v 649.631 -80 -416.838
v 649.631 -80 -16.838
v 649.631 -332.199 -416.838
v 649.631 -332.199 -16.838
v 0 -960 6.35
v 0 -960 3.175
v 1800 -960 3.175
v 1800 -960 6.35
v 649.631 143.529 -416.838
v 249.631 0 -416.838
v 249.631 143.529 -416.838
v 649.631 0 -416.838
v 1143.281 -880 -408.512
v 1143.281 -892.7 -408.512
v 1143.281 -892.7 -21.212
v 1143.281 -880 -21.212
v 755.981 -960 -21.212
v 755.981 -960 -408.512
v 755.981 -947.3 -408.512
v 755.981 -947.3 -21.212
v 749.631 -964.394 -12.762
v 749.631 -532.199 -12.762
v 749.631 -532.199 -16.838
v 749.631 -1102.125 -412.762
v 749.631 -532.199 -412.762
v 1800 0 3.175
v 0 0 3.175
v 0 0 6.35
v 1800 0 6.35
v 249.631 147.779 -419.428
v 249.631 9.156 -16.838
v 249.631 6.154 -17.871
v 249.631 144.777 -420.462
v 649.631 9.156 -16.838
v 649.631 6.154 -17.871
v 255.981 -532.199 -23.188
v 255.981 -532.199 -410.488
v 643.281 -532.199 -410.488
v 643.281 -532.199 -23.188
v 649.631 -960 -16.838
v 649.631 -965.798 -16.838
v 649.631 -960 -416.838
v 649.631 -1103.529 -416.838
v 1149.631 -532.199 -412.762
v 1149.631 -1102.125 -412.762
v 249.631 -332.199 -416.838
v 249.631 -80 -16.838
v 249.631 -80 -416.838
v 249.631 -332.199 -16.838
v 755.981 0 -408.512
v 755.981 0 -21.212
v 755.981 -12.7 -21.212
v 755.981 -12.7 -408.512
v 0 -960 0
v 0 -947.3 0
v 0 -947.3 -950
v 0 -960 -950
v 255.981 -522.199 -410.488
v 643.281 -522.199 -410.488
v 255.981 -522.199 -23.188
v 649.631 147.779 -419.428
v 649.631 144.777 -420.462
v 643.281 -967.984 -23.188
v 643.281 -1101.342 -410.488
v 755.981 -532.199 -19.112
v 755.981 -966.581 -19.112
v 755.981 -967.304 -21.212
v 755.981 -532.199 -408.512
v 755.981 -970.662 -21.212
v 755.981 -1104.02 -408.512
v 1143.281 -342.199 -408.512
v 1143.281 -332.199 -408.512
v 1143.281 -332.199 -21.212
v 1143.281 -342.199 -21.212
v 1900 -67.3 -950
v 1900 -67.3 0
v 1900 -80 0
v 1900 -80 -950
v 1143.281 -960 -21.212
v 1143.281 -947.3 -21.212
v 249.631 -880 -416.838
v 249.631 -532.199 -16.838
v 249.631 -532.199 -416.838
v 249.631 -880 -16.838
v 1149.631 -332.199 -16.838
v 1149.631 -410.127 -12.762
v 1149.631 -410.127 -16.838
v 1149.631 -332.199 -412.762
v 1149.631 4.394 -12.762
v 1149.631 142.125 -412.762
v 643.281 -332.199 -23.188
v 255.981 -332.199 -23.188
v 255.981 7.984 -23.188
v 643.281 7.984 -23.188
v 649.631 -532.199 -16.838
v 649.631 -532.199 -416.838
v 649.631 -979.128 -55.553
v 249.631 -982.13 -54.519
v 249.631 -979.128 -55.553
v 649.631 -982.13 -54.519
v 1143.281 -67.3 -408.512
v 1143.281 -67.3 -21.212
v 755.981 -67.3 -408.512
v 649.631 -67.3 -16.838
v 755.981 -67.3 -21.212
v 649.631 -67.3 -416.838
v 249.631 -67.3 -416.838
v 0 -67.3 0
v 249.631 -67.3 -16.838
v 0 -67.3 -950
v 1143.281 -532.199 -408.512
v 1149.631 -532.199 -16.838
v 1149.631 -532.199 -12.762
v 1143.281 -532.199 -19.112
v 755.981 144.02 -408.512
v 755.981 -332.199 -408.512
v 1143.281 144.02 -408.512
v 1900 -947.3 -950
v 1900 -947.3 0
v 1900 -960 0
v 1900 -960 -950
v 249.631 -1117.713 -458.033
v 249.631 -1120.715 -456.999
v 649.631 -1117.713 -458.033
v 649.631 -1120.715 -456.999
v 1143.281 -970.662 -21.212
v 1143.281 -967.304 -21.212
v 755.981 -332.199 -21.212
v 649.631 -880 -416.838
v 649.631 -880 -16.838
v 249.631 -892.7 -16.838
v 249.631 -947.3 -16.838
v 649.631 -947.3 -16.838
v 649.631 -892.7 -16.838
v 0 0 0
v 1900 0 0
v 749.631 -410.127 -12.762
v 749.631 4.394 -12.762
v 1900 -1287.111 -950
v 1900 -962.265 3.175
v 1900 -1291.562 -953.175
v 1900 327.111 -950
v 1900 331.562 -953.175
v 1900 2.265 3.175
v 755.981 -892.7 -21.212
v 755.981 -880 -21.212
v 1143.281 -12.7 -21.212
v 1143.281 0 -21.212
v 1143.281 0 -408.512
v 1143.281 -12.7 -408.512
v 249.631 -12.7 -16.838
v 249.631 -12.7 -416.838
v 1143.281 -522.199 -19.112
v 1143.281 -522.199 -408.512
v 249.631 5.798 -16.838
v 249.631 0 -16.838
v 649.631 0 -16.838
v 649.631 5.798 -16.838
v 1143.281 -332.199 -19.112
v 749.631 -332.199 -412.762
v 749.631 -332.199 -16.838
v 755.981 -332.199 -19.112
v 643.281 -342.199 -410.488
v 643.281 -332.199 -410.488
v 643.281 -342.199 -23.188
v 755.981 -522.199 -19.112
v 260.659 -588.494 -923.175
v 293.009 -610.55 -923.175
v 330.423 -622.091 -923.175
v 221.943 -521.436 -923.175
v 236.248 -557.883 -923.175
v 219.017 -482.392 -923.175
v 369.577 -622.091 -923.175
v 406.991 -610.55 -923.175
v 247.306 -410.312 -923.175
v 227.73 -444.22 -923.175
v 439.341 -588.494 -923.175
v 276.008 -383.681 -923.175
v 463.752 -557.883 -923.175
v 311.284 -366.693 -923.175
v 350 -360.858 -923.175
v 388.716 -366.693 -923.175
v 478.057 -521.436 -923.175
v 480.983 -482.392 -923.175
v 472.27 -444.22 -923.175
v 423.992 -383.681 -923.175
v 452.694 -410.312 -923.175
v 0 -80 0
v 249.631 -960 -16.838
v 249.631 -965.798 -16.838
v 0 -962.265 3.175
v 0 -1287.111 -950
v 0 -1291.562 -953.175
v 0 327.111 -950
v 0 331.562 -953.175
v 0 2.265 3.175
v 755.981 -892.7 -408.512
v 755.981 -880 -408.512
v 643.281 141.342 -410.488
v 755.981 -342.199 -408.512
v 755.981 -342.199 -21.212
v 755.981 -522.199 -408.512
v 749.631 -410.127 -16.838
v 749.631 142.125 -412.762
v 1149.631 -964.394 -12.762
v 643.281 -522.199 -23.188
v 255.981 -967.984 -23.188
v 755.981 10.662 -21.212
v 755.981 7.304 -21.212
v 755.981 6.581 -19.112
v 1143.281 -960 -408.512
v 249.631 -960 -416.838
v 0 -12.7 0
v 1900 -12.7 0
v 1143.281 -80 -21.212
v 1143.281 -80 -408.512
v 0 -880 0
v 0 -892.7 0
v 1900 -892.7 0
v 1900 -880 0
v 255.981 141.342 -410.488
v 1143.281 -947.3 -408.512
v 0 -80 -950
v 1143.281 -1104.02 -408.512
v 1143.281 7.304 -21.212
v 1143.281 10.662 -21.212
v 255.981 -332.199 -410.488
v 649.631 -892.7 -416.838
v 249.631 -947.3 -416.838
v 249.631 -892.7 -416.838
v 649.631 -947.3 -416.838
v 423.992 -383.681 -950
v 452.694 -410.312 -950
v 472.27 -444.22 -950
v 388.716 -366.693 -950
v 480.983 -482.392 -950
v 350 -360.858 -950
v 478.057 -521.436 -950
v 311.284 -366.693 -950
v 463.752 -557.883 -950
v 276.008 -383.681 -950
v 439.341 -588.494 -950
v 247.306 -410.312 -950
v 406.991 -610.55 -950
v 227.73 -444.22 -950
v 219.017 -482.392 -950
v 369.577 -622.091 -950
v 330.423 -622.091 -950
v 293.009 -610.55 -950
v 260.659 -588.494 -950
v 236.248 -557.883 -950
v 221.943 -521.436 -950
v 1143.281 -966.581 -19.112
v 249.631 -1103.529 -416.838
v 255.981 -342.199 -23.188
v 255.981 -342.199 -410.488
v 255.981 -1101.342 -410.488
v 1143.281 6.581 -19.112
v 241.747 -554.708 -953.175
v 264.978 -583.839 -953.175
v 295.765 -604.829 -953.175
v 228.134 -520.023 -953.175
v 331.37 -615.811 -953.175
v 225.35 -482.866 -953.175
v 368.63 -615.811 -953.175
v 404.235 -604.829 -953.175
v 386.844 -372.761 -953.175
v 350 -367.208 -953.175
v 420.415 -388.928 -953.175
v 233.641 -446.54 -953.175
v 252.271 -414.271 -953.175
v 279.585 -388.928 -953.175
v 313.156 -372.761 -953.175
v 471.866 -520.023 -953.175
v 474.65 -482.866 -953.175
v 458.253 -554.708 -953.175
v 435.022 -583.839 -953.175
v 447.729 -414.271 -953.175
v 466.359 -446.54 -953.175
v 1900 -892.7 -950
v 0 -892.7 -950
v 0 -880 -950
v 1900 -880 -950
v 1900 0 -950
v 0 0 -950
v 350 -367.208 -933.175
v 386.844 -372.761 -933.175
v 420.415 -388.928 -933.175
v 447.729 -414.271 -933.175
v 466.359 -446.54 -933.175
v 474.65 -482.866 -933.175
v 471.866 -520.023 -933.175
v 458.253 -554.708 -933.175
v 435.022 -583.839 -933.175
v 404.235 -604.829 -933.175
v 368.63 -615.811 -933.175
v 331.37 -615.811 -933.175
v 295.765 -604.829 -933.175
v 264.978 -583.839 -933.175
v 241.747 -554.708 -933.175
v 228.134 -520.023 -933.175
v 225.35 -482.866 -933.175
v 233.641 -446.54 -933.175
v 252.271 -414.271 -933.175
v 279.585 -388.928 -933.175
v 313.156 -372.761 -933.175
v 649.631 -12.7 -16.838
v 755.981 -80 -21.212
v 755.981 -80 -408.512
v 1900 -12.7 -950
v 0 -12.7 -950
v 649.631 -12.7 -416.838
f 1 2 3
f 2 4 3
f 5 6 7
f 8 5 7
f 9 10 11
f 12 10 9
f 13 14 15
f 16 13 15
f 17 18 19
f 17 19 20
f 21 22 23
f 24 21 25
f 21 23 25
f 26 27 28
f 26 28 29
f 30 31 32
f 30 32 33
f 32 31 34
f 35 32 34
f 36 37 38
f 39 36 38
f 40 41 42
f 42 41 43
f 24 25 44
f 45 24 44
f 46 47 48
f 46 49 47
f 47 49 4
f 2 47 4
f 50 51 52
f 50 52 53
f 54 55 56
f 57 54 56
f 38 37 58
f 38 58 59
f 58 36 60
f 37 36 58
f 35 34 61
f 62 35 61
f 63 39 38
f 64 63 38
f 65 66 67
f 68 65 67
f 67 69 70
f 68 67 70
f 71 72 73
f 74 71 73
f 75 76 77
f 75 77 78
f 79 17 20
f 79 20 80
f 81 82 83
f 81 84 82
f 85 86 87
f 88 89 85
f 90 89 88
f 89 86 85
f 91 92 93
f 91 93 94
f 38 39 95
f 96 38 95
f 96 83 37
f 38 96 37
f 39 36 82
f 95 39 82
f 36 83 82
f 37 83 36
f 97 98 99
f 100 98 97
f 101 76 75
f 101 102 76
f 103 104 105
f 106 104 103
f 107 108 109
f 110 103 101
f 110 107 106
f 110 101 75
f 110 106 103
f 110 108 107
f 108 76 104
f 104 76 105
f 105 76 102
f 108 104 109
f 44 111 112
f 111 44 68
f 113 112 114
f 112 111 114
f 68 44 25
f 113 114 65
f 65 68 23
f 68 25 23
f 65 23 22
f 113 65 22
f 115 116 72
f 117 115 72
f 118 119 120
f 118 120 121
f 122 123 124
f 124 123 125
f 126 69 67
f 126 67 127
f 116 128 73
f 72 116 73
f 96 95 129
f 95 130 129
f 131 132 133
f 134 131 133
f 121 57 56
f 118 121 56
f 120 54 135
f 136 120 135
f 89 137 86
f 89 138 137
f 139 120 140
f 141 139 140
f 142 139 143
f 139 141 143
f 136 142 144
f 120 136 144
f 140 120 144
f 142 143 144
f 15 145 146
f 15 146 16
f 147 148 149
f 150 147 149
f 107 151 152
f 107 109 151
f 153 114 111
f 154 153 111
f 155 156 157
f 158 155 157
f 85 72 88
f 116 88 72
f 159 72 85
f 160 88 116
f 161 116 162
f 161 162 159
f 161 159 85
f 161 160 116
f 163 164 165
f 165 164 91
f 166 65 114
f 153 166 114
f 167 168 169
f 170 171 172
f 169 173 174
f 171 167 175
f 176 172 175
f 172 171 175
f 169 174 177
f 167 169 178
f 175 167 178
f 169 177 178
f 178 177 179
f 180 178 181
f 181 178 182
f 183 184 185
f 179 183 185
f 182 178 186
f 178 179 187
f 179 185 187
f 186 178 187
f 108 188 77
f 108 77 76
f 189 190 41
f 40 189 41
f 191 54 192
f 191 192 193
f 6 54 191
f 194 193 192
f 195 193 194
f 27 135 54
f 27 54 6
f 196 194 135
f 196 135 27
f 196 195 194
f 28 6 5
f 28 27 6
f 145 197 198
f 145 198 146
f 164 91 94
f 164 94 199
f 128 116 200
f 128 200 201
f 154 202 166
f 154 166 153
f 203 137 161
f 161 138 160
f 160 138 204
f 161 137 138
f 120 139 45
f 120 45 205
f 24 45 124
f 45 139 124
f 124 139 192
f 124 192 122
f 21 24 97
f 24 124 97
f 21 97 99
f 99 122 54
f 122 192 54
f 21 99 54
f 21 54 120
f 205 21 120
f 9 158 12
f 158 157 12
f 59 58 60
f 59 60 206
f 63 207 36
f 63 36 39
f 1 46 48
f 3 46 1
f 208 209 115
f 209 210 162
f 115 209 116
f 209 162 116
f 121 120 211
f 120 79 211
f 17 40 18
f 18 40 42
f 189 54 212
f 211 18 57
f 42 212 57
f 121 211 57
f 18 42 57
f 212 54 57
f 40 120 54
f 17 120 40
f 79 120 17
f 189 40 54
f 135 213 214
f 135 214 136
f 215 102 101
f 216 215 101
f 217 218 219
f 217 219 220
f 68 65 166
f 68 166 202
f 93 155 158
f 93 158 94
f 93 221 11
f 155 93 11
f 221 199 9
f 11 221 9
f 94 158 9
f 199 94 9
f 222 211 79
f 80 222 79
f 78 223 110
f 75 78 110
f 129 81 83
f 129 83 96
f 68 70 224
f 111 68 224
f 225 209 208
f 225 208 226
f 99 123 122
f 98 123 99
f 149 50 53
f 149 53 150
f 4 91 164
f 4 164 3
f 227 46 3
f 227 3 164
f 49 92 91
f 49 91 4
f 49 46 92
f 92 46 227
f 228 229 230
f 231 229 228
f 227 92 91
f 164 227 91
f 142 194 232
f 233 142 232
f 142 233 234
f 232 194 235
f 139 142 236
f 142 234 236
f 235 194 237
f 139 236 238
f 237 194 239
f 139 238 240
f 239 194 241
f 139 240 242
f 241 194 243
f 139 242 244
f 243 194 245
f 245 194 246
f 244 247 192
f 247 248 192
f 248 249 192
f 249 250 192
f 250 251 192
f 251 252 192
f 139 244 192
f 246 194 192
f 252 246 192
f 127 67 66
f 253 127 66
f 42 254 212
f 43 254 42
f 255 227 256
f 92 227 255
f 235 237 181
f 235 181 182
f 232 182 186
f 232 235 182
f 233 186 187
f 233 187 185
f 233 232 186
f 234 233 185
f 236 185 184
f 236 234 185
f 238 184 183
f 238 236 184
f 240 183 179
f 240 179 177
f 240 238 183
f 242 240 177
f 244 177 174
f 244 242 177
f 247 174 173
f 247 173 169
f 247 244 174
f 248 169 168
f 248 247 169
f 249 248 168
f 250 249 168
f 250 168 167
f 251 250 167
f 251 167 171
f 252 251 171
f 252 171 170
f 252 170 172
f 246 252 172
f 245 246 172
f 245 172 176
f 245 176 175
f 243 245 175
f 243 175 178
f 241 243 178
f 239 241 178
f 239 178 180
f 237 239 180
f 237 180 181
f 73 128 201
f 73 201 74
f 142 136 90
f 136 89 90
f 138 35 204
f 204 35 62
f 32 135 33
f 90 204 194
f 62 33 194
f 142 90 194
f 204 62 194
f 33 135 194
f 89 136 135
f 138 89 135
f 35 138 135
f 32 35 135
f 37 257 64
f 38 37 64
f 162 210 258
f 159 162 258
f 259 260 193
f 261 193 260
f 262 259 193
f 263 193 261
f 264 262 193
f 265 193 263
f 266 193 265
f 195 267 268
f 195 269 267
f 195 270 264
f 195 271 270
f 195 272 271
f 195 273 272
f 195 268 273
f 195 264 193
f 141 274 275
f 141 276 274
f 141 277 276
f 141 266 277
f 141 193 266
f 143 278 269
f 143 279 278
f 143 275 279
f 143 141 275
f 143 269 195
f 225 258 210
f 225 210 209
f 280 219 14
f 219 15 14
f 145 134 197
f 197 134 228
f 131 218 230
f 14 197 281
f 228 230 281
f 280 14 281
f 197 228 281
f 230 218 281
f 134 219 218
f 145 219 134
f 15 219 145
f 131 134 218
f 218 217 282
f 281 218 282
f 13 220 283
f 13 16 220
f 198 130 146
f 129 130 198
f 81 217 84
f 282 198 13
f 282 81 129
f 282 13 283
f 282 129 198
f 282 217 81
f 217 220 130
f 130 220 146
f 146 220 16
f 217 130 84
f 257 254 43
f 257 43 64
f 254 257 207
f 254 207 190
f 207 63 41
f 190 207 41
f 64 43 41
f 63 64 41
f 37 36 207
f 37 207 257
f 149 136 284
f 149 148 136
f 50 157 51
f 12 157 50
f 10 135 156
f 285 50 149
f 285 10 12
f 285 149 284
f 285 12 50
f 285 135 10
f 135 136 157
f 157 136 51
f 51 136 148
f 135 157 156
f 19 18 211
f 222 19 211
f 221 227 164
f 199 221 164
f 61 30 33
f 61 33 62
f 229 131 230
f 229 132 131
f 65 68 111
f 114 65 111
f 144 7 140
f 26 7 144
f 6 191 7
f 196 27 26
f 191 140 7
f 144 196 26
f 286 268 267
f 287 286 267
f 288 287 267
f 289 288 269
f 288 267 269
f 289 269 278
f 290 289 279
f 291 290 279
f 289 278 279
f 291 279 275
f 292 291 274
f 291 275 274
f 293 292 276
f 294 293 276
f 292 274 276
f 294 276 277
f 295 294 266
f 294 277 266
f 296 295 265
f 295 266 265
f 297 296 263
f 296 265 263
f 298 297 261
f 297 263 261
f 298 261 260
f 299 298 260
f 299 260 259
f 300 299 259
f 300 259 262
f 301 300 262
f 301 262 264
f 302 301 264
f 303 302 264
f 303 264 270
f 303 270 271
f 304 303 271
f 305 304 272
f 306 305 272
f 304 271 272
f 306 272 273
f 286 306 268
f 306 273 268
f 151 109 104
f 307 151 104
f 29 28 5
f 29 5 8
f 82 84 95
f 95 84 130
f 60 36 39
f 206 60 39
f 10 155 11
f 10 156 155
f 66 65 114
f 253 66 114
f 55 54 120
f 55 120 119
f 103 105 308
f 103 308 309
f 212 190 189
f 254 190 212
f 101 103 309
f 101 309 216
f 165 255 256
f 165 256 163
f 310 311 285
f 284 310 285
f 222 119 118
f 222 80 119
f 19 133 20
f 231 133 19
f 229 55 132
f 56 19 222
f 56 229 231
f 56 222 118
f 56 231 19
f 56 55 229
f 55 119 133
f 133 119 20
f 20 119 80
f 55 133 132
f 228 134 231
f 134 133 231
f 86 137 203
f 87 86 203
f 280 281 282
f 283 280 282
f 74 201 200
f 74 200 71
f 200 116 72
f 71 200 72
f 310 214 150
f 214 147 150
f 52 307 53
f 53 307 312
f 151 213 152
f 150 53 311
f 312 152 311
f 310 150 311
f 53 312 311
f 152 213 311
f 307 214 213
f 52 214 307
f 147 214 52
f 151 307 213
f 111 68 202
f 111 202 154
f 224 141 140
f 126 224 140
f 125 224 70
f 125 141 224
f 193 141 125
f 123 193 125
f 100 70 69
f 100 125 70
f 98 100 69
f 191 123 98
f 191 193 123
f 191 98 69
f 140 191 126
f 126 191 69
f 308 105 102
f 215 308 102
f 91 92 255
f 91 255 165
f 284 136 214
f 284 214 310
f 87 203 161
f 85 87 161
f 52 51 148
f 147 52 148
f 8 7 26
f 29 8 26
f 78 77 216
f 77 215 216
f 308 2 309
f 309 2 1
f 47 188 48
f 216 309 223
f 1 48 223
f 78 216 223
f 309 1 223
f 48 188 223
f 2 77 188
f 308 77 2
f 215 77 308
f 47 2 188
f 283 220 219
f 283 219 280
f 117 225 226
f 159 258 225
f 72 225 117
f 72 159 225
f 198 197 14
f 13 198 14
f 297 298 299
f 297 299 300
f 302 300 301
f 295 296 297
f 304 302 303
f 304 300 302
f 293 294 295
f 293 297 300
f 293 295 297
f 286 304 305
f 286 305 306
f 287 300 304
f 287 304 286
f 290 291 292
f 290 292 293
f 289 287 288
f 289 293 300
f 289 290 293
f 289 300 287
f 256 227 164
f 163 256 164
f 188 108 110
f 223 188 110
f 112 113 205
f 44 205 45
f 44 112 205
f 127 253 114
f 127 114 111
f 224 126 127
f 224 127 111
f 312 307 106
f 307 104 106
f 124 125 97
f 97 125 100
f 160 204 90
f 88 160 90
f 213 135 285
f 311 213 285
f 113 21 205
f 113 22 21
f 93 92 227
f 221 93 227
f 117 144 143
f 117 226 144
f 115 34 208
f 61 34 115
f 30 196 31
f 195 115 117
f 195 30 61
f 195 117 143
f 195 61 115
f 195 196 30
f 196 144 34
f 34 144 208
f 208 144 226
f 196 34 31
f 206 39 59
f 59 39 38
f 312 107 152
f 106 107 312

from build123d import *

# Parameters (mm, degrees)
SKETCH1_W                       = 1800
SKETCH1_H                       = 960
BOSS_EXTRUDE1_DEPTH             = 6.35
BOSS_EXTRUDE2_DEPTH             = 1900
SKETCH6_W                       = 400
SKETCH6_H                       = 425.788292868
CUT_EXTRUDE1_DEPTH              = 300
SKETCH7_W                       = 400
SKETCH7_H                       = 425.67110899
CUT_EXTRUDE2_DEPTH              = 300
BOSS_EXTRUDE4_REACH             = 2489.303
SKETCH8_W                       = 400
SKETCH8_H                       = 400
SKETCH8_W_2                     = 387.3
SKETCH8_H_2                     = 387.3
BOSS_EXTRUDE4_DIRECTION_2_REACH = 2489.303
SKETCH11_R                      = 131.35
BOSS_EXTRUDE6_DEPTH             = 30
SKETCH12_R                      = 125
CUT_EXTRUDE5_DEPTH              = 20
BOSS_EXTRUDE7_REACH             = 2489.303
SKETCH14_W                      = 400
SKETCH14_H                      = 400
SKETCH14_W_2                    = 387.3
SKETCH14_H_2                    = 387.3
BOSS_EXTRUDE7_DIRECTION_2_REACH = 2489.303
CUT_EXTRUDE6_START              = -1104.02001
SKETCH15_W                      = 387.3
SKETCH15_H                      = 387.3
CUT_EXTRUDE6_DEPTH              = 1248.04002
SKETCH16_W                      = 400
SKETCH16_H                      = 200
CUT_EXTRUDE8_DEPTH              = 940
SKETCH18_W                      = 4.075824643
SKETCH18_H                      = 122.071298875
CUT_EXTRUDE9_DEPTH              = 410
SKETCH19_W                      = 387.3
SKETCH19_H                      = 387.3
BOSS_EXTRUDE22_DEPTH            = 10
SKETCH22_W                      = 387.3
SKETCH22_H                      = 389.400481364
BOSS_EXTRUDE24_DEPTH            = 10
SKETCH23_W                      = 387.3
SKETCH23_H                      = 387.3
BOSS_EXTRUDE25_DEPTH            = 10
SKETCH24_W                      = 387.3
SKETCH24_H                      = 387.3
BOSS_EXTRUDE26_DEPTH            = 10
SKETCH25_W                      = 950
SKETCH25_H                      = 12.7
BOSS_EXTRUDE27_DEPTH            = 1900
SKETCH26_W                      = 387.3
SKETCH26_H                      = 387.3
CUT_EXTRUDE10_DEPTH             = 300
SKETCH27_W                      = 387.3
SKETCH27_H                      = 387.3
CUT_EXTRUDE11_DEPTH             = 300
SKETCH28_W                      = 387.3
SKETCH28_H                      = 387.3
CUT_EXTRUDE12_DEPTH             = 300
SKETCH29_W                      = 387.3
SKETCH29_H                      = 387.3
CUT_EXTRUDE13_DEPTH             = 300


with BuildPart() as part:
    # Sketch1 → Boss-Extrude1 (new body)
    with BuildSketch(Plane.XY):
        with Locations((900, -480)):
            Rectangle(SKETCH1_W, SKETCH1_H)
    extrude(amount=BOSS_EXTRUDE1_DEPTH)

    # Sketch2 → Boss-Extrude2 (add)
    with BuildSketch(Plane(origin=(0, 0, 0), x_dir=(0, 0, -1), z_dir=(1, 0, 0))):
        Polygon((-3.175, -962.264705491), (-3.175, 2.264705491), (953.175, 331.56241846), (953.175, -1291.56241846), align=None)
        Polygon((0, 0), (950, 327.111232625), (950, -1287.111232625), (0, -960), align=None, mode=Mode.SUBTRACT)
    extrude(amount=BOSS_EXTRUDE2_DEPTH)

    # Sketch6 → Cut-Extrude1 (cut)
    with BuildSketch(Plane(origin=(0, 3.002021478, 1.03367889), x_dir=(1, 0, 0), z_dir=(0, 0.9455185755993153, 0.32556815445716086))):
        with Locations((449.631164922, 231.795224093)):
            Rectangle(SKETCH6_W, SKETCH6_H)
    extrude(amount=-CUT_EXTRUDE1_DEPTH, mode=Mode.SUBTRACT)

    # Sketch7 → Cut-Extrude2 (cut)
    with BuildSketch(Plane(origin=(0, -861.247183209, 296.551187047), x_dir=(1, 0, 0), z_dir=(0, -0.9455185755993154, 0.32556815445716053))):
        with Locations((449.631164922, -584.134563657)):
            Rectangle(SKETCH7_W, SKETCH7_H)
    extrude(amount=-CUT_EXTRUDE2_DEPTH, mode=Mode.SUBTRACT)

    # Sketch11 → Boss-Extrude6 (add)
    with BuildSketch(Plane(origin=(0, 0, -953.175), x_dir=(-1, 0, 0), z_dir=(0, 0, -1))):
        with Locations(Location((-350, -492.20758154, 0), (0, 0, 90))):
            Circle(SKETCH11_R)
    extrude(amount=-BOSS_EXTRUDE6_DEPTH)

    # Sketch12 → Cut-Extrude5 (cut)
    with BuildSketch(Plane(origin=(0, 0, -953.175), x_dir=(-1, 0, 0), z_dir=(0, 0, -1))):
        with Locations(Location((-350, -492.20758154, 0), (0, 0, 90))):
            Circle(SKETCH12_R)
    extrude(amount=-CUT_EXTRUDE5_DEPTH, mode=Mode.SUBTRACT)

    # Boss-Extrude7: up to this plane
    boss_extrude7_end = Plane(origin=(1900, 0, 0), z_dir=(0, -0.9455185755993153, -0.325568154457161))
    # Sketch14 → Boss-Extrude7 (add, up to the surface)
    with BuildSketch(Plane(origin=(0, 0, 0), x_dir=(1, 0, 0), z_dir=(0, 1, 0)), mode=Mode.PRIVATE) as boss_extrude7_sk1:
        with Locations((949.631164922, 212.761816492)):
            Rectangle(SKETCH14_W, SKETCH14_H)
        with Locations((949.631164922, 212.761816492)):
            Rectangle(SKETCH14_W_2, SKETCH14_H_2, mode=Mode.SUBTRACT)
    boss_extrude7_tool1 = split(extrude(boss_extrude7_sk1.sketch, amount=BOSS_EXTRUDE7_REACH, mode=Mode.PRIVATE), bisect_by=boss_extrude7_end, keep=Keep.BOTH, mode=Mode.PRIVATE)
    add(boss_extrude7_tool1.solids().sort_by_distance((949.631165, 0, -407.104962))[0])

    # Boss-Extrude7 direction 2: up to this plane
    boss_extrude7_direction_2_end = Plane(origin=(1900, -1287.111232625, -950), z_dir=(0, 0.9455185755993156, -0.3255681544571603))
    # Sketch14 → Boss-Extrude7 direction 2 (add, up to the surface)
    with BuildSketch(Plane(origin=(0, 0, 0), x_dir=(1, 0, 0), z_dir=(0, 1, 0)), mode=Mode.PRIVATE) as boss_extrude7_direction_2_sk1:
        with Locations((949.631164922, 212.761816492)):
            Rectangle(SKETCH14_W, SKETCH14_H)
        with Locations((949.631164922, 212.761816492)):
            Rectangle(SKETCH14_W_2, SKETCH14_H_2, mode=Mode.SUBTRACT)
    boss_extrude7_direction_2_tool1 = split(extrude(boss_extrude7_direction_2_sk1.sketch, amount=-BOSS_EXTRUDE7_DIRECTION_2_REACH, mode=Mode.PRIVATE), bisect_by=boss_extrude7_direction_2_end, keep=Keep.BOTH, mode=Mode.PRIVATE)
    add(boss_extrude7_direction_2_tool1.solids().sort_by_distance((949.631165, 0, -407.104962))[0])

    # Sketch15 → Cut-Extrude6 (cut)
    with BuildSketch(Plane(origin=(0, 0, 0), x_dir=(1, 0, 0), z_dir=(0, 1, 0)).offset(CUT_EXTRUDE6_START)):
        with Locations((949.631164922, 214.862297856)):
            Rectangle(SKETCH15_W, SKETCH15_H)
    extrude(amount=CUT_EXTRUDE6_DEPTH, mode=Mode.SUBTRACT)


with BuildPart() as body_2:
    # Boss-Extrude4: up to this plane
    boss_extrude4_end = Plane(origin=(1900, -1287.111232625, -950), z_dir=(0, 0.9455185755993156, -0.3255681544571603))
    # Sketch8 → Boss-Extrude4 (new, up to the surface)
    with BuildSketch(Plane(origin=(0, 0, 0), x_dir=(1, 0, 0), z_dir=(0, 1, 0)), mode=Mode.PRIVATE) as boss_extrude4_sk1:
        with Locations((449.631164922, 216.837641135)):
            Rectangle(SKETCH8_W, SKETCH8_H)
        with Locations((449.631164922, 216.837641135)):
            Rectangle(SKETCH8_W_2, SKETCH8_H_2, mode=Mode.SUBTRACT)
    boss_extrude4_tool1 = split(extrude(boss_extrude4_sk1.sketch, amount=-BOSS_EXTRUDE4_REACH, mode=Mode.PRIVATE), bisect_by=boss_extrude4_end, keep=Keep.BOTH, mode=Mode.PRIVATE)
    add(boss_extrude4_tool1.solids().sort_by_distance((449.631165, 0, -22.494495))[0])

    # Boss-Extrude4 direction 2: up to this plane
    boss_extrude4_direction_2_end = Plane(origin=(1900, 0, 0), z_dir=(0, -0.9455185755993153, -0.325568154457161))
    # Sketch8 → Boss-Extrude4 direction 2 (add, up to the surface)
    with BuildSketch(Plane(origin=(0, 0, 0), x_dir=(1, 0, 0), z_dir=(0, 1, 0)), mode=Mode.PRIVATE) as boss_extrude4_direction_2_sk1:
        with Locations((449.631164922, 216.837641135)):
            Rectangle(SKETCH8_W, SKETCH8_H)
        with Locations((449.631164922, 216.837641135)):
            Rectangle(SKETCH8_W_2, SKETCH8_H_2, mode=Mode.SUBTRACT)
    boss_extrude4_direction_2_tool1 = split(extrude(boss_extrude4_direction_2_sk1.sketch, amount=BOSS_EXTRUDE4_DIRECTION_2_REACH, mode=Mode.PRIVATE), bisect_by=boss_extrude4_direction_2_end, keep=Keep.BOTH, mode=Mode.PRIVATE)
    add(boss_extrude4_direction_2_tool1.solids().sort_by_distance((449.631165, 0, -22.494495))[0])


with BuildPart() as cut_extrude8_tool:
    # Sketch16 → Cut-Extrude8 (new body)
    with BuildSketch(Plane.ZY.offset(-249.631164922)):
        with Locations((-216.837641135, -432.198710101)):
            Rectangle(SKETCH16_W, SKETCH16_H)
    extrude(amount=-CUT_EXTRUDE8_DEPTH)


with BuildPart() as part_1:
    add(part.part)

    # Cut-Extrude8: cut by cut_extrude8_tool
    add(cut_extrude8_tool.part, mode=Mode.SUBTRACT)

    # Sketch18 → Cut-Extrude9 (cut)
    with BuildSketch(Plane(origin=(1149.631164922, 0, 0), x_dir=(0, 0, -1), z_dir=(1, 0, 0))):
        with Locations((14.799728814, -471.163060664)):
            Rectangle(SKETCH18_W, SKETCH18_H)
    extrude(amount=-CUT_EXTRUDE9_DEPTH, mode=Mode.SUBTRACT)


with BuildPart() as body_2_1:
    add(body_2.part)

    # Cut-Extrude8: cut by cut_extrude8_tool
    add(cut_extrude8_tool.part, mode=Mode.SUBTRACT)

    # Sketch25 → Boss-Extrude27 (add)
    with BuildSketch(Plane(origin=(0, 0, 0), x_dir=(0, 0, -1), z_dir=(1, 0, 0))):
        with Locations((475, -953.65)):
            Rectangle(SKETCH25_W, SKETCH25_H)
        with Locations((475, -886.35)):
            Rectangle(SKETCH25_W, SKETCH25_H)
        with Locations((475, -73.65)):
            Rectangle(SKETCH25_W, SKETCH25_H)
        with Locations((475, -6.35)):
            Rectangle(SKETCH25_W, SKETCH25_H)
    extrude(amount=BOSS_EXTRUDE27_DEPTH)

    # Sketch26 → Cut-Extrude10 (cut)
    with BuildSketch(Plane(origin=(0, 0, 0), x_dir=(1, 0, 0), z_dir=(0, 1, 0))):
        with Locations((449.631164922, 216.837641135)):
            Rectangle(SKETCH26_W, SKETCH26_H)
    extrude(amount=-CUT_EXTRUDE10_DEPTH, mode=Mode.SUBTRACT)

    # Sketch27 → Cut-Extrude11 (cut)
    with BuildSketch(Plane(origin=(0, 0, 0), x_dir=(1, 0, 0), z_dir=(0, 1, 0))):
        with Locations((949.631164922, 214.862297856)):
            Rectangle(SKETCH27_W, SKETCH27_H)
    extrude(amount=-CUT_EXTRUDE11_DEPTH, mode=Mode.SUBTRACT)

    # Sketch28 → Cut-Extrude12 (cut)
    with BuildSketch(Plane.XZ.offset(960)):
        with Locations((949.631164922, -214.862297856)):
            Rectangle(SKETCH28_W, SKETCH28_H)
    extrude(amount=-CUT_EXTRUDE12_DEPTH, mode=Mode.SUBTRACT)

    # Sketch29 → Cut-Extrude13 (cut)
    with BuildSketch(Plane.XZ.offset(960)):
        with Locations((449.631164922, -216.837641135)):
            Rectangle(SKETCH29_W, SKETCH29_H)
    extrude(amount=-CUT_EXTRUDE13_DEPTH, mode=Mode.SUBTRACT)


with BuildPart() as body_3:
    # Sketch19 → Boss-Extrude22 (new body)
    with BuildSketch(Plane.XZ.offset(332.198710101)):
        with Locations((949.631164922, -214.862297856)):
            Rectangle(SKETCH19_W, SKETCH19_H)
    extrude(amount=BOSS_EXTRUDE22_DEPTH)


with BuildPart() as body_4:
    # Sketch22 → Boss-Extrude24 (new body)
    with BuildSketch(Plane(origin=(0, -532.198710101, 0), x_dir=(1, 0, 0), z_dir=(0, 1, 0))):
        with Locations((949.631164922, 213.812057174)):
            Rectangle(SKETCH22_W, SKETCH22_H)
    extrude(amount=BOSS_EXTRUDE24_DEPTH)


with BuildPart() as body_5:
    # Sketch23 → Boss-Extrude25 (new body)
    with BuildSketch(Plane(origin=(0, -532.198710101, 0), x_dir=(1, 0, 0), z_dir=(0, 1, 0))):
        with Locations((449.631164922, 216.837641135)):
            Rectangle(SKETCH23_W, SKETCH23_H)
    extrude(amount=BOSS_EXTRUDE25_DEPTH)


with BuildPart() as body_6:
    # Sketch24 → Boss-Extrude26 (new body)
    with BuildSketch(Plane.XZ.offset(332.198710101)):
        with Locations((449.631164922, -216.837641135)):
            Rectangle(SKETCH24_W, SKETCH24_H)
    extrude(amount=BOSS_EXTRUDE26_DEPTH)


solid = Compound([part_1.part, body_2_1.part, body_3.part, body_4.part, body_5.part, body_6.part])
